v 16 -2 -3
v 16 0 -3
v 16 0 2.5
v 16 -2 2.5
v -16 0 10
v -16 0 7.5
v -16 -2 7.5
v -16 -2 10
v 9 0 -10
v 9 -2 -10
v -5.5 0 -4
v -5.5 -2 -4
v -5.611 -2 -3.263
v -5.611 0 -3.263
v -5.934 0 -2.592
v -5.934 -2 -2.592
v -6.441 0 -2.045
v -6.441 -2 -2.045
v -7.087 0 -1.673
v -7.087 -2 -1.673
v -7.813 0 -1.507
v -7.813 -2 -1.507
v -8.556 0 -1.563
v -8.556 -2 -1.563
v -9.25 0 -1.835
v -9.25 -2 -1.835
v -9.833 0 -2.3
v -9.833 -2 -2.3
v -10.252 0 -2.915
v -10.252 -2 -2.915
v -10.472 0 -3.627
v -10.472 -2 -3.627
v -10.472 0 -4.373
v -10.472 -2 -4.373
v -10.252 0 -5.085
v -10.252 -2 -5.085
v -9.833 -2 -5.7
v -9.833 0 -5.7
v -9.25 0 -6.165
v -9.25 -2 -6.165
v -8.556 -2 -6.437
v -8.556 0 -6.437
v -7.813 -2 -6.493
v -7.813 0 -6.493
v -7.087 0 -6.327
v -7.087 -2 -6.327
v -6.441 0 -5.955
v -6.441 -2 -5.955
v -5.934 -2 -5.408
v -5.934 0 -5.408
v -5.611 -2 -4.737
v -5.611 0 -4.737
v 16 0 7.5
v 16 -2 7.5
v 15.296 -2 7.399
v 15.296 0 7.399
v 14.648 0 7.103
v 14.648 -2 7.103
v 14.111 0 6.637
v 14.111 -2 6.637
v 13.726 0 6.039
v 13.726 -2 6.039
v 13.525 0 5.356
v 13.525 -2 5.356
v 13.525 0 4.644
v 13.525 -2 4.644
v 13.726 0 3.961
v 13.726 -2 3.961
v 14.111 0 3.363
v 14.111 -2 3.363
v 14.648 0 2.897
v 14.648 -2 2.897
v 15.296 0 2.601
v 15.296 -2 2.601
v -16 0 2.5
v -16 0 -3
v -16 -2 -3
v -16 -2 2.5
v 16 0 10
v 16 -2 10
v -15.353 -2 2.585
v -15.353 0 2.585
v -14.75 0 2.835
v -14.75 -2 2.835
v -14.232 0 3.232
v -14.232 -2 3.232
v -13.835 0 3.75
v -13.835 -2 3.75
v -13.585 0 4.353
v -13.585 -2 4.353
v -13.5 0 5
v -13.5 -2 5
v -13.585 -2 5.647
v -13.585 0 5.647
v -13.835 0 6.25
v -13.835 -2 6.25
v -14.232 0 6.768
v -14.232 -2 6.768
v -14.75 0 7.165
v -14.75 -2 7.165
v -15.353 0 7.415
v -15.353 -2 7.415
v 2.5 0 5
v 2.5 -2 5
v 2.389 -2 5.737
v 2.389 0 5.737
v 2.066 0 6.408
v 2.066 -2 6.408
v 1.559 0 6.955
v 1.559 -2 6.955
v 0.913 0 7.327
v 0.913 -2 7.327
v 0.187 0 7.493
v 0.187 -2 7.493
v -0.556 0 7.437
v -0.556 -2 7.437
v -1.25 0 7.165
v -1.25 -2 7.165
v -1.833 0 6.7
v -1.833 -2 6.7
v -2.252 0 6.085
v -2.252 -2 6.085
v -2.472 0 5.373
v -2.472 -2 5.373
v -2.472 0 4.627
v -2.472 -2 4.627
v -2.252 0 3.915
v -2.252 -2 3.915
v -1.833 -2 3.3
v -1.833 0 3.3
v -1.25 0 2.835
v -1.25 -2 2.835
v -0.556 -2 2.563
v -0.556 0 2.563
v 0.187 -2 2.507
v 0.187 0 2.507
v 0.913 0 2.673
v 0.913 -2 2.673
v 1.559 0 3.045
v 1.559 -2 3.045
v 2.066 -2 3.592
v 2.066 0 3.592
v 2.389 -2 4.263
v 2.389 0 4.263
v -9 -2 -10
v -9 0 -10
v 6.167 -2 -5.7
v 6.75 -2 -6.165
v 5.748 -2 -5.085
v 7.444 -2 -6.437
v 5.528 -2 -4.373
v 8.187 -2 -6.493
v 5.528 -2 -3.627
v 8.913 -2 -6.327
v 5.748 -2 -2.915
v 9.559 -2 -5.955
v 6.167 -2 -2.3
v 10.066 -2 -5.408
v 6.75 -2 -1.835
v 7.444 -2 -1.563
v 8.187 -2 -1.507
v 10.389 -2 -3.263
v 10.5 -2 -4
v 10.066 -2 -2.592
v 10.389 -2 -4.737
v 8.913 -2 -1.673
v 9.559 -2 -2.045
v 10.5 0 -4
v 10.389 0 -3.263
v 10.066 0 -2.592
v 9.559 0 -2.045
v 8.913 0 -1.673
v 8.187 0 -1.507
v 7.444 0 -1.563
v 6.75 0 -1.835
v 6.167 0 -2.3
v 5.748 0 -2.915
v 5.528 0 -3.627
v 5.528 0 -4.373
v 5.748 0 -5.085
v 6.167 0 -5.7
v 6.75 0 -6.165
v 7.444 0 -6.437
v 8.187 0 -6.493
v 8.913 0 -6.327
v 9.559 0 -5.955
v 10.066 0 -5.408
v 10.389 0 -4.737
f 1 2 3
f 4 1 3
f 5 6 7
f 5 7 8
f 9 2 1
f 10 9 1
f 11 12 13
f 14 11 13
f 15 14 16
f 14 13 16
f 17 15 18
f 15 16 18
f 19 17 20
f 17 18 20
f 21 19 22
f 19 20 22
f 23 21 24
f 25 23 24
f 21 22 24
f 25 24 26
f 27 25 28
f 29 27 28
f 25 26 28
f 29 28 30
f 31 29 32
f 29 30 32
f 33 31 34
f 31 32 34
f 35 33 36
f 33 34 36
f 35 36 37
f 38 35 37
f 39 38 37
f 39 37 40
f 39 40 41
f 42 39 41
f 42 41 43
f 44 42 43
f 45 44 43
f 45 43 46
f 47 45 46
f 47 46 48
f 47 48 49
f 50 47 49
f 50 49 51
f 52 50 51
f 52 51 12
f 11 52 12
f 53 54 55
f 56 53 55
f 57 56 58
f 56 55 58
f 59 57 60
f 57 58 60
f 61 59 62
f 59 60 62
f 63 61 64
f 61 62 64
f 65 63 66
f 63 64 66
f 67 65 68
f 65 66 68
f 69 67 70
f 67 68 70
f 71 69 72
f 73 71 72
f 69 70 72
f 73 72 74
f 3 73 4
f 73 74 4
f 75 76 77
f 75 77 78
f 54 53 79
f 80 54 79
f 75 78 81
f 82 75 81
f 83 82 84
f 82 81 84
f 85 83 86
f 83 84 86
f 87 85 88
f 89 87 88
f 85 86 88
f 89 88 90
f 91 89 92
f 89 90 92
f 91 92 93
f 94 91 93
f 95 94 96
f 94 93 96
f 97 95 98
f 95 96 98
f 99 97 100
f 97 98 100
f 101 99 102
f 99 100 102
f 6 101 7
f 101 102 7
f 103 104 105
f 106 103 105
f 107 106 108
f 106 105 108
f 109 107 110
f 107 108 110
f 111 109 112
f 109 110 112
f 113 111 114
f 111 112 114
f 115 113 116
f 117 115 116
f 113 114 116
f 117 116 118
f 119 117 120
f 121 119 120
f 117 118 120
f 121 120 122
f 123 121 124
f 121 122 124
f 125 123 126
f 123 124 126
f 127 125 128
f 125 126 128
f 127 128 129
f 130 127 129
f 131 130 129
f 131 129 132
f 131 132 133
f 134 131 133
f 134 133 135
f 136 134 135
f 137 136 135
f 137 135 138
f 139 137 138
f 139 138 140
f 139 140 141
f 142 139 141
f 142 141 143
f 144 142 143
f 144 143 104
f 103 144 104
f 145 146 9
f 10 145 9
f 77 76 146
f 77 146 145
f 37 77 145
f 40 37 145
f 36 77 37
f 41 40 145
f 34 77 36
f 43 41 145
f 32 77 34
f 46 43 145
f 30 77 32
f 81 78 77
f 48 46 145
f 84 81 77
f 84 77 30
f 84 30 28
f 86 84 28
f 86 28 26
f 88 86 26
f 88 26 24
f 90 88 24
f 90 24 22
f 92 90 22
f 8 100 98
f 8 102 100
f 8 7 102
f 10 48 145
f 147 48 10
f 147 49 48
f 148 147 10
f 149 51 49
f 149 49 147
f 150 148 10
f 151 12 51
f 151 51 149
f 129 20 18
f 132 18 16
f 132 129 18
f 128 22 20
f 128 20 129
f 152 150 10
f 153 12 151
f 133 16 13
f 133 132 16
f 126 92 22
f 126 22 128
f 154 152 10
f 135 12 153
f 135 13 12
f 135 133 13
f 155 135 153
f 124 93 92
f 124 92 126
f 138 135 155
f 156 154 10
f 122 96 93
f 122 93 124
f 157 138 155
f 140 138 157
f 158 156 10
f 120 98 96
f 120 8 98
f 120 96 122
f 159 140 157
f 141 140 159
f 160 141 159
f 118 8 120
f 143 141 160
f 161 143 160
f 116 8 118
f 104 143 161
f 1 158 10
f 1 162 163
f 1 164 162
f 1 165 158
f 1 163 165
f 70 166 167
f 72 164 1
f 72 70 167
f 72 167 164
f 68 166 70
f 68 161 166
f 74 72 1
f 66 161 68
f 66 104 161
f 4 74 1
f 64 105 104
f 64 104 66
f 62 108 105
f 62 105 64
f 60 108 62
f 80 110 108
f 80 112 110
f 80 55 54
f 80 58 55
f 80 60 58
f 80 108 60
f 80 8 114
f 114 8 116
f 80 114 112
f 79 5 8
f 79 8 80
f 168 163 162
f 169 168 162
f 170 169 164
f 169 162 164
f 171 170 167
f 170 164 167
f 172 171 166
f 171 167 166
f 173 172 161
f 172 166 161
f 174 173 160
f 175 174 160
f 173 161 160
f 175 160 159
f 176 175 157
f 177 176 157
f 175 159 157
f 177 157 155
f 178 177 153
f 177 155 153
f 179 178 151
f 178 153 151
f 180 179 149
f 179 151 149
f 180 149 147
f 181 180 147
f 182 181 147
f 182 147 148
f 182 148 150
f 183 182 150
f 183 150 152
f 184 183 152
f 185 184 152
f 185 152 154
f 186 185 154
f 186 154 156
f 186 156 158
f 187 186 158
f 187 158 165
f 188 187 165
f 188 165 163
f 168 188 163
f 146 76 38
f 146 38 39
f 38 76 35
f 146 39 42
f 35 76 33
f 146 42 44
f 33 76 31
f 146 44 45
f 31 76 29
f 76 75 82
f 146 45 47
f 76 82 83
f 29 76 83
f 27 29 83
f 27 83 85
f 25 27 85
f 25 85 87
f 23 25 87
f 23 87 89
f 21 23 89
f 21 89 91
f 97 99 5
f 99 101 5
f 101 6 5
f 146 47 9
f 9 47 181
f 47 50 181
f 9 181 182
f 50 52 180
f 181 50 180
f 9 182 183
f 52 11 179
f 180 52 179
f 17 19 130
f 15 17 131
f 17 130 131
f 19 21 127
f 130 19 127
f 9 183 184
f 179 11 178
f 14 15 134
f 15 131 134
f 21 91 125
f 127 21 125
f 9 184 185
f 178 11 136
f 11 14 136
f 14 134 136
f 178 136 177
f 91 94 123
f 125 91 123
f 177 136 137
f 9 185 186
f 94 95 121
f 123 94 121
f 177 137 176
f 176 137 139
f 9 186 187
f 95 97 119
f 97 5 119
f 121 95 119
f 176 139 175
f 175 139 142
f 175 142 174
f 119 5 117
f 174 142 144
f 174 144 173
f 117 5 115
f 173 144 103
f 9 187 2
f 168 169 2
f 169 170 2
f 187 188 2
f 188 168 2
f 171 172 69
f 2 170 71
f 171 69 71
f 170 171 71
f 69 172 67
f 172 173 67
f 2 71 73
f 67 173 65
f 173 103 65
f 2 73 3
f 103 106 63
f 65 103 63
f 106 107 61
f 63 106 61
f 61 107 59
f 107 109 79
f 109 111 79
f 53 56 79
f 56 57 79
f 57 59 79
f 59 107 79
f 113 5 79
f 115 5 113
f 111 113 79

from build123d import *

# Parameters (mm, degrees)
F0_W     = 32
F0_H     = 20
F1_DEPTH = 2
F2_SIZE  = 7
F3_R     = 2.5
F4_DEPTH = 25


with BuildPart() as f1:
    # F0 (on Front) → F1 (new body)
    with BuildSketch(Plane.XZ):
        Rectangle(F0_W, F0_H)
    extrude(amount=F1_DEPTH)

    # F2
    f2_edges = [f1.edges().sort_by_distance(p)[0] for p in [
        (-16, -1, -10),
        (16, -1, -10),
    ]]
    chamfer(f2_edges, length=F2_SIZE)

    # F3 (on face) → F4 (cut)
    with BuildSketch(Plane.XZ.offset(2)):
        with BuildLine():
            ThreePointArc((-16, 2.5), (-14.232233047, 3.232233047), (-13.5, 5))
            ThreePointArc((-13.5, 5), (-14.232233047, 6.767766953), (-16, 7.5))
            Line((-16, 7.5), (-16, 2.5))
        make_face()
        with Locations((0, 5)):
            Circle(F3_R)
        with Locations((-8, -4)):
            Circle(F3_R)
        with Locations((8, -4)):
            Circle(F3_R)
        with BuildLine():
            Line((16, 2.5), (16, 7.5))
            ThreePointArc((16, 7.5), (13.5, 5), (16, 2.5))
        make_face()
    extrude(amount=-F4_DEPTH, mode=Mode.SUBTRACT)


solid = f1.part
